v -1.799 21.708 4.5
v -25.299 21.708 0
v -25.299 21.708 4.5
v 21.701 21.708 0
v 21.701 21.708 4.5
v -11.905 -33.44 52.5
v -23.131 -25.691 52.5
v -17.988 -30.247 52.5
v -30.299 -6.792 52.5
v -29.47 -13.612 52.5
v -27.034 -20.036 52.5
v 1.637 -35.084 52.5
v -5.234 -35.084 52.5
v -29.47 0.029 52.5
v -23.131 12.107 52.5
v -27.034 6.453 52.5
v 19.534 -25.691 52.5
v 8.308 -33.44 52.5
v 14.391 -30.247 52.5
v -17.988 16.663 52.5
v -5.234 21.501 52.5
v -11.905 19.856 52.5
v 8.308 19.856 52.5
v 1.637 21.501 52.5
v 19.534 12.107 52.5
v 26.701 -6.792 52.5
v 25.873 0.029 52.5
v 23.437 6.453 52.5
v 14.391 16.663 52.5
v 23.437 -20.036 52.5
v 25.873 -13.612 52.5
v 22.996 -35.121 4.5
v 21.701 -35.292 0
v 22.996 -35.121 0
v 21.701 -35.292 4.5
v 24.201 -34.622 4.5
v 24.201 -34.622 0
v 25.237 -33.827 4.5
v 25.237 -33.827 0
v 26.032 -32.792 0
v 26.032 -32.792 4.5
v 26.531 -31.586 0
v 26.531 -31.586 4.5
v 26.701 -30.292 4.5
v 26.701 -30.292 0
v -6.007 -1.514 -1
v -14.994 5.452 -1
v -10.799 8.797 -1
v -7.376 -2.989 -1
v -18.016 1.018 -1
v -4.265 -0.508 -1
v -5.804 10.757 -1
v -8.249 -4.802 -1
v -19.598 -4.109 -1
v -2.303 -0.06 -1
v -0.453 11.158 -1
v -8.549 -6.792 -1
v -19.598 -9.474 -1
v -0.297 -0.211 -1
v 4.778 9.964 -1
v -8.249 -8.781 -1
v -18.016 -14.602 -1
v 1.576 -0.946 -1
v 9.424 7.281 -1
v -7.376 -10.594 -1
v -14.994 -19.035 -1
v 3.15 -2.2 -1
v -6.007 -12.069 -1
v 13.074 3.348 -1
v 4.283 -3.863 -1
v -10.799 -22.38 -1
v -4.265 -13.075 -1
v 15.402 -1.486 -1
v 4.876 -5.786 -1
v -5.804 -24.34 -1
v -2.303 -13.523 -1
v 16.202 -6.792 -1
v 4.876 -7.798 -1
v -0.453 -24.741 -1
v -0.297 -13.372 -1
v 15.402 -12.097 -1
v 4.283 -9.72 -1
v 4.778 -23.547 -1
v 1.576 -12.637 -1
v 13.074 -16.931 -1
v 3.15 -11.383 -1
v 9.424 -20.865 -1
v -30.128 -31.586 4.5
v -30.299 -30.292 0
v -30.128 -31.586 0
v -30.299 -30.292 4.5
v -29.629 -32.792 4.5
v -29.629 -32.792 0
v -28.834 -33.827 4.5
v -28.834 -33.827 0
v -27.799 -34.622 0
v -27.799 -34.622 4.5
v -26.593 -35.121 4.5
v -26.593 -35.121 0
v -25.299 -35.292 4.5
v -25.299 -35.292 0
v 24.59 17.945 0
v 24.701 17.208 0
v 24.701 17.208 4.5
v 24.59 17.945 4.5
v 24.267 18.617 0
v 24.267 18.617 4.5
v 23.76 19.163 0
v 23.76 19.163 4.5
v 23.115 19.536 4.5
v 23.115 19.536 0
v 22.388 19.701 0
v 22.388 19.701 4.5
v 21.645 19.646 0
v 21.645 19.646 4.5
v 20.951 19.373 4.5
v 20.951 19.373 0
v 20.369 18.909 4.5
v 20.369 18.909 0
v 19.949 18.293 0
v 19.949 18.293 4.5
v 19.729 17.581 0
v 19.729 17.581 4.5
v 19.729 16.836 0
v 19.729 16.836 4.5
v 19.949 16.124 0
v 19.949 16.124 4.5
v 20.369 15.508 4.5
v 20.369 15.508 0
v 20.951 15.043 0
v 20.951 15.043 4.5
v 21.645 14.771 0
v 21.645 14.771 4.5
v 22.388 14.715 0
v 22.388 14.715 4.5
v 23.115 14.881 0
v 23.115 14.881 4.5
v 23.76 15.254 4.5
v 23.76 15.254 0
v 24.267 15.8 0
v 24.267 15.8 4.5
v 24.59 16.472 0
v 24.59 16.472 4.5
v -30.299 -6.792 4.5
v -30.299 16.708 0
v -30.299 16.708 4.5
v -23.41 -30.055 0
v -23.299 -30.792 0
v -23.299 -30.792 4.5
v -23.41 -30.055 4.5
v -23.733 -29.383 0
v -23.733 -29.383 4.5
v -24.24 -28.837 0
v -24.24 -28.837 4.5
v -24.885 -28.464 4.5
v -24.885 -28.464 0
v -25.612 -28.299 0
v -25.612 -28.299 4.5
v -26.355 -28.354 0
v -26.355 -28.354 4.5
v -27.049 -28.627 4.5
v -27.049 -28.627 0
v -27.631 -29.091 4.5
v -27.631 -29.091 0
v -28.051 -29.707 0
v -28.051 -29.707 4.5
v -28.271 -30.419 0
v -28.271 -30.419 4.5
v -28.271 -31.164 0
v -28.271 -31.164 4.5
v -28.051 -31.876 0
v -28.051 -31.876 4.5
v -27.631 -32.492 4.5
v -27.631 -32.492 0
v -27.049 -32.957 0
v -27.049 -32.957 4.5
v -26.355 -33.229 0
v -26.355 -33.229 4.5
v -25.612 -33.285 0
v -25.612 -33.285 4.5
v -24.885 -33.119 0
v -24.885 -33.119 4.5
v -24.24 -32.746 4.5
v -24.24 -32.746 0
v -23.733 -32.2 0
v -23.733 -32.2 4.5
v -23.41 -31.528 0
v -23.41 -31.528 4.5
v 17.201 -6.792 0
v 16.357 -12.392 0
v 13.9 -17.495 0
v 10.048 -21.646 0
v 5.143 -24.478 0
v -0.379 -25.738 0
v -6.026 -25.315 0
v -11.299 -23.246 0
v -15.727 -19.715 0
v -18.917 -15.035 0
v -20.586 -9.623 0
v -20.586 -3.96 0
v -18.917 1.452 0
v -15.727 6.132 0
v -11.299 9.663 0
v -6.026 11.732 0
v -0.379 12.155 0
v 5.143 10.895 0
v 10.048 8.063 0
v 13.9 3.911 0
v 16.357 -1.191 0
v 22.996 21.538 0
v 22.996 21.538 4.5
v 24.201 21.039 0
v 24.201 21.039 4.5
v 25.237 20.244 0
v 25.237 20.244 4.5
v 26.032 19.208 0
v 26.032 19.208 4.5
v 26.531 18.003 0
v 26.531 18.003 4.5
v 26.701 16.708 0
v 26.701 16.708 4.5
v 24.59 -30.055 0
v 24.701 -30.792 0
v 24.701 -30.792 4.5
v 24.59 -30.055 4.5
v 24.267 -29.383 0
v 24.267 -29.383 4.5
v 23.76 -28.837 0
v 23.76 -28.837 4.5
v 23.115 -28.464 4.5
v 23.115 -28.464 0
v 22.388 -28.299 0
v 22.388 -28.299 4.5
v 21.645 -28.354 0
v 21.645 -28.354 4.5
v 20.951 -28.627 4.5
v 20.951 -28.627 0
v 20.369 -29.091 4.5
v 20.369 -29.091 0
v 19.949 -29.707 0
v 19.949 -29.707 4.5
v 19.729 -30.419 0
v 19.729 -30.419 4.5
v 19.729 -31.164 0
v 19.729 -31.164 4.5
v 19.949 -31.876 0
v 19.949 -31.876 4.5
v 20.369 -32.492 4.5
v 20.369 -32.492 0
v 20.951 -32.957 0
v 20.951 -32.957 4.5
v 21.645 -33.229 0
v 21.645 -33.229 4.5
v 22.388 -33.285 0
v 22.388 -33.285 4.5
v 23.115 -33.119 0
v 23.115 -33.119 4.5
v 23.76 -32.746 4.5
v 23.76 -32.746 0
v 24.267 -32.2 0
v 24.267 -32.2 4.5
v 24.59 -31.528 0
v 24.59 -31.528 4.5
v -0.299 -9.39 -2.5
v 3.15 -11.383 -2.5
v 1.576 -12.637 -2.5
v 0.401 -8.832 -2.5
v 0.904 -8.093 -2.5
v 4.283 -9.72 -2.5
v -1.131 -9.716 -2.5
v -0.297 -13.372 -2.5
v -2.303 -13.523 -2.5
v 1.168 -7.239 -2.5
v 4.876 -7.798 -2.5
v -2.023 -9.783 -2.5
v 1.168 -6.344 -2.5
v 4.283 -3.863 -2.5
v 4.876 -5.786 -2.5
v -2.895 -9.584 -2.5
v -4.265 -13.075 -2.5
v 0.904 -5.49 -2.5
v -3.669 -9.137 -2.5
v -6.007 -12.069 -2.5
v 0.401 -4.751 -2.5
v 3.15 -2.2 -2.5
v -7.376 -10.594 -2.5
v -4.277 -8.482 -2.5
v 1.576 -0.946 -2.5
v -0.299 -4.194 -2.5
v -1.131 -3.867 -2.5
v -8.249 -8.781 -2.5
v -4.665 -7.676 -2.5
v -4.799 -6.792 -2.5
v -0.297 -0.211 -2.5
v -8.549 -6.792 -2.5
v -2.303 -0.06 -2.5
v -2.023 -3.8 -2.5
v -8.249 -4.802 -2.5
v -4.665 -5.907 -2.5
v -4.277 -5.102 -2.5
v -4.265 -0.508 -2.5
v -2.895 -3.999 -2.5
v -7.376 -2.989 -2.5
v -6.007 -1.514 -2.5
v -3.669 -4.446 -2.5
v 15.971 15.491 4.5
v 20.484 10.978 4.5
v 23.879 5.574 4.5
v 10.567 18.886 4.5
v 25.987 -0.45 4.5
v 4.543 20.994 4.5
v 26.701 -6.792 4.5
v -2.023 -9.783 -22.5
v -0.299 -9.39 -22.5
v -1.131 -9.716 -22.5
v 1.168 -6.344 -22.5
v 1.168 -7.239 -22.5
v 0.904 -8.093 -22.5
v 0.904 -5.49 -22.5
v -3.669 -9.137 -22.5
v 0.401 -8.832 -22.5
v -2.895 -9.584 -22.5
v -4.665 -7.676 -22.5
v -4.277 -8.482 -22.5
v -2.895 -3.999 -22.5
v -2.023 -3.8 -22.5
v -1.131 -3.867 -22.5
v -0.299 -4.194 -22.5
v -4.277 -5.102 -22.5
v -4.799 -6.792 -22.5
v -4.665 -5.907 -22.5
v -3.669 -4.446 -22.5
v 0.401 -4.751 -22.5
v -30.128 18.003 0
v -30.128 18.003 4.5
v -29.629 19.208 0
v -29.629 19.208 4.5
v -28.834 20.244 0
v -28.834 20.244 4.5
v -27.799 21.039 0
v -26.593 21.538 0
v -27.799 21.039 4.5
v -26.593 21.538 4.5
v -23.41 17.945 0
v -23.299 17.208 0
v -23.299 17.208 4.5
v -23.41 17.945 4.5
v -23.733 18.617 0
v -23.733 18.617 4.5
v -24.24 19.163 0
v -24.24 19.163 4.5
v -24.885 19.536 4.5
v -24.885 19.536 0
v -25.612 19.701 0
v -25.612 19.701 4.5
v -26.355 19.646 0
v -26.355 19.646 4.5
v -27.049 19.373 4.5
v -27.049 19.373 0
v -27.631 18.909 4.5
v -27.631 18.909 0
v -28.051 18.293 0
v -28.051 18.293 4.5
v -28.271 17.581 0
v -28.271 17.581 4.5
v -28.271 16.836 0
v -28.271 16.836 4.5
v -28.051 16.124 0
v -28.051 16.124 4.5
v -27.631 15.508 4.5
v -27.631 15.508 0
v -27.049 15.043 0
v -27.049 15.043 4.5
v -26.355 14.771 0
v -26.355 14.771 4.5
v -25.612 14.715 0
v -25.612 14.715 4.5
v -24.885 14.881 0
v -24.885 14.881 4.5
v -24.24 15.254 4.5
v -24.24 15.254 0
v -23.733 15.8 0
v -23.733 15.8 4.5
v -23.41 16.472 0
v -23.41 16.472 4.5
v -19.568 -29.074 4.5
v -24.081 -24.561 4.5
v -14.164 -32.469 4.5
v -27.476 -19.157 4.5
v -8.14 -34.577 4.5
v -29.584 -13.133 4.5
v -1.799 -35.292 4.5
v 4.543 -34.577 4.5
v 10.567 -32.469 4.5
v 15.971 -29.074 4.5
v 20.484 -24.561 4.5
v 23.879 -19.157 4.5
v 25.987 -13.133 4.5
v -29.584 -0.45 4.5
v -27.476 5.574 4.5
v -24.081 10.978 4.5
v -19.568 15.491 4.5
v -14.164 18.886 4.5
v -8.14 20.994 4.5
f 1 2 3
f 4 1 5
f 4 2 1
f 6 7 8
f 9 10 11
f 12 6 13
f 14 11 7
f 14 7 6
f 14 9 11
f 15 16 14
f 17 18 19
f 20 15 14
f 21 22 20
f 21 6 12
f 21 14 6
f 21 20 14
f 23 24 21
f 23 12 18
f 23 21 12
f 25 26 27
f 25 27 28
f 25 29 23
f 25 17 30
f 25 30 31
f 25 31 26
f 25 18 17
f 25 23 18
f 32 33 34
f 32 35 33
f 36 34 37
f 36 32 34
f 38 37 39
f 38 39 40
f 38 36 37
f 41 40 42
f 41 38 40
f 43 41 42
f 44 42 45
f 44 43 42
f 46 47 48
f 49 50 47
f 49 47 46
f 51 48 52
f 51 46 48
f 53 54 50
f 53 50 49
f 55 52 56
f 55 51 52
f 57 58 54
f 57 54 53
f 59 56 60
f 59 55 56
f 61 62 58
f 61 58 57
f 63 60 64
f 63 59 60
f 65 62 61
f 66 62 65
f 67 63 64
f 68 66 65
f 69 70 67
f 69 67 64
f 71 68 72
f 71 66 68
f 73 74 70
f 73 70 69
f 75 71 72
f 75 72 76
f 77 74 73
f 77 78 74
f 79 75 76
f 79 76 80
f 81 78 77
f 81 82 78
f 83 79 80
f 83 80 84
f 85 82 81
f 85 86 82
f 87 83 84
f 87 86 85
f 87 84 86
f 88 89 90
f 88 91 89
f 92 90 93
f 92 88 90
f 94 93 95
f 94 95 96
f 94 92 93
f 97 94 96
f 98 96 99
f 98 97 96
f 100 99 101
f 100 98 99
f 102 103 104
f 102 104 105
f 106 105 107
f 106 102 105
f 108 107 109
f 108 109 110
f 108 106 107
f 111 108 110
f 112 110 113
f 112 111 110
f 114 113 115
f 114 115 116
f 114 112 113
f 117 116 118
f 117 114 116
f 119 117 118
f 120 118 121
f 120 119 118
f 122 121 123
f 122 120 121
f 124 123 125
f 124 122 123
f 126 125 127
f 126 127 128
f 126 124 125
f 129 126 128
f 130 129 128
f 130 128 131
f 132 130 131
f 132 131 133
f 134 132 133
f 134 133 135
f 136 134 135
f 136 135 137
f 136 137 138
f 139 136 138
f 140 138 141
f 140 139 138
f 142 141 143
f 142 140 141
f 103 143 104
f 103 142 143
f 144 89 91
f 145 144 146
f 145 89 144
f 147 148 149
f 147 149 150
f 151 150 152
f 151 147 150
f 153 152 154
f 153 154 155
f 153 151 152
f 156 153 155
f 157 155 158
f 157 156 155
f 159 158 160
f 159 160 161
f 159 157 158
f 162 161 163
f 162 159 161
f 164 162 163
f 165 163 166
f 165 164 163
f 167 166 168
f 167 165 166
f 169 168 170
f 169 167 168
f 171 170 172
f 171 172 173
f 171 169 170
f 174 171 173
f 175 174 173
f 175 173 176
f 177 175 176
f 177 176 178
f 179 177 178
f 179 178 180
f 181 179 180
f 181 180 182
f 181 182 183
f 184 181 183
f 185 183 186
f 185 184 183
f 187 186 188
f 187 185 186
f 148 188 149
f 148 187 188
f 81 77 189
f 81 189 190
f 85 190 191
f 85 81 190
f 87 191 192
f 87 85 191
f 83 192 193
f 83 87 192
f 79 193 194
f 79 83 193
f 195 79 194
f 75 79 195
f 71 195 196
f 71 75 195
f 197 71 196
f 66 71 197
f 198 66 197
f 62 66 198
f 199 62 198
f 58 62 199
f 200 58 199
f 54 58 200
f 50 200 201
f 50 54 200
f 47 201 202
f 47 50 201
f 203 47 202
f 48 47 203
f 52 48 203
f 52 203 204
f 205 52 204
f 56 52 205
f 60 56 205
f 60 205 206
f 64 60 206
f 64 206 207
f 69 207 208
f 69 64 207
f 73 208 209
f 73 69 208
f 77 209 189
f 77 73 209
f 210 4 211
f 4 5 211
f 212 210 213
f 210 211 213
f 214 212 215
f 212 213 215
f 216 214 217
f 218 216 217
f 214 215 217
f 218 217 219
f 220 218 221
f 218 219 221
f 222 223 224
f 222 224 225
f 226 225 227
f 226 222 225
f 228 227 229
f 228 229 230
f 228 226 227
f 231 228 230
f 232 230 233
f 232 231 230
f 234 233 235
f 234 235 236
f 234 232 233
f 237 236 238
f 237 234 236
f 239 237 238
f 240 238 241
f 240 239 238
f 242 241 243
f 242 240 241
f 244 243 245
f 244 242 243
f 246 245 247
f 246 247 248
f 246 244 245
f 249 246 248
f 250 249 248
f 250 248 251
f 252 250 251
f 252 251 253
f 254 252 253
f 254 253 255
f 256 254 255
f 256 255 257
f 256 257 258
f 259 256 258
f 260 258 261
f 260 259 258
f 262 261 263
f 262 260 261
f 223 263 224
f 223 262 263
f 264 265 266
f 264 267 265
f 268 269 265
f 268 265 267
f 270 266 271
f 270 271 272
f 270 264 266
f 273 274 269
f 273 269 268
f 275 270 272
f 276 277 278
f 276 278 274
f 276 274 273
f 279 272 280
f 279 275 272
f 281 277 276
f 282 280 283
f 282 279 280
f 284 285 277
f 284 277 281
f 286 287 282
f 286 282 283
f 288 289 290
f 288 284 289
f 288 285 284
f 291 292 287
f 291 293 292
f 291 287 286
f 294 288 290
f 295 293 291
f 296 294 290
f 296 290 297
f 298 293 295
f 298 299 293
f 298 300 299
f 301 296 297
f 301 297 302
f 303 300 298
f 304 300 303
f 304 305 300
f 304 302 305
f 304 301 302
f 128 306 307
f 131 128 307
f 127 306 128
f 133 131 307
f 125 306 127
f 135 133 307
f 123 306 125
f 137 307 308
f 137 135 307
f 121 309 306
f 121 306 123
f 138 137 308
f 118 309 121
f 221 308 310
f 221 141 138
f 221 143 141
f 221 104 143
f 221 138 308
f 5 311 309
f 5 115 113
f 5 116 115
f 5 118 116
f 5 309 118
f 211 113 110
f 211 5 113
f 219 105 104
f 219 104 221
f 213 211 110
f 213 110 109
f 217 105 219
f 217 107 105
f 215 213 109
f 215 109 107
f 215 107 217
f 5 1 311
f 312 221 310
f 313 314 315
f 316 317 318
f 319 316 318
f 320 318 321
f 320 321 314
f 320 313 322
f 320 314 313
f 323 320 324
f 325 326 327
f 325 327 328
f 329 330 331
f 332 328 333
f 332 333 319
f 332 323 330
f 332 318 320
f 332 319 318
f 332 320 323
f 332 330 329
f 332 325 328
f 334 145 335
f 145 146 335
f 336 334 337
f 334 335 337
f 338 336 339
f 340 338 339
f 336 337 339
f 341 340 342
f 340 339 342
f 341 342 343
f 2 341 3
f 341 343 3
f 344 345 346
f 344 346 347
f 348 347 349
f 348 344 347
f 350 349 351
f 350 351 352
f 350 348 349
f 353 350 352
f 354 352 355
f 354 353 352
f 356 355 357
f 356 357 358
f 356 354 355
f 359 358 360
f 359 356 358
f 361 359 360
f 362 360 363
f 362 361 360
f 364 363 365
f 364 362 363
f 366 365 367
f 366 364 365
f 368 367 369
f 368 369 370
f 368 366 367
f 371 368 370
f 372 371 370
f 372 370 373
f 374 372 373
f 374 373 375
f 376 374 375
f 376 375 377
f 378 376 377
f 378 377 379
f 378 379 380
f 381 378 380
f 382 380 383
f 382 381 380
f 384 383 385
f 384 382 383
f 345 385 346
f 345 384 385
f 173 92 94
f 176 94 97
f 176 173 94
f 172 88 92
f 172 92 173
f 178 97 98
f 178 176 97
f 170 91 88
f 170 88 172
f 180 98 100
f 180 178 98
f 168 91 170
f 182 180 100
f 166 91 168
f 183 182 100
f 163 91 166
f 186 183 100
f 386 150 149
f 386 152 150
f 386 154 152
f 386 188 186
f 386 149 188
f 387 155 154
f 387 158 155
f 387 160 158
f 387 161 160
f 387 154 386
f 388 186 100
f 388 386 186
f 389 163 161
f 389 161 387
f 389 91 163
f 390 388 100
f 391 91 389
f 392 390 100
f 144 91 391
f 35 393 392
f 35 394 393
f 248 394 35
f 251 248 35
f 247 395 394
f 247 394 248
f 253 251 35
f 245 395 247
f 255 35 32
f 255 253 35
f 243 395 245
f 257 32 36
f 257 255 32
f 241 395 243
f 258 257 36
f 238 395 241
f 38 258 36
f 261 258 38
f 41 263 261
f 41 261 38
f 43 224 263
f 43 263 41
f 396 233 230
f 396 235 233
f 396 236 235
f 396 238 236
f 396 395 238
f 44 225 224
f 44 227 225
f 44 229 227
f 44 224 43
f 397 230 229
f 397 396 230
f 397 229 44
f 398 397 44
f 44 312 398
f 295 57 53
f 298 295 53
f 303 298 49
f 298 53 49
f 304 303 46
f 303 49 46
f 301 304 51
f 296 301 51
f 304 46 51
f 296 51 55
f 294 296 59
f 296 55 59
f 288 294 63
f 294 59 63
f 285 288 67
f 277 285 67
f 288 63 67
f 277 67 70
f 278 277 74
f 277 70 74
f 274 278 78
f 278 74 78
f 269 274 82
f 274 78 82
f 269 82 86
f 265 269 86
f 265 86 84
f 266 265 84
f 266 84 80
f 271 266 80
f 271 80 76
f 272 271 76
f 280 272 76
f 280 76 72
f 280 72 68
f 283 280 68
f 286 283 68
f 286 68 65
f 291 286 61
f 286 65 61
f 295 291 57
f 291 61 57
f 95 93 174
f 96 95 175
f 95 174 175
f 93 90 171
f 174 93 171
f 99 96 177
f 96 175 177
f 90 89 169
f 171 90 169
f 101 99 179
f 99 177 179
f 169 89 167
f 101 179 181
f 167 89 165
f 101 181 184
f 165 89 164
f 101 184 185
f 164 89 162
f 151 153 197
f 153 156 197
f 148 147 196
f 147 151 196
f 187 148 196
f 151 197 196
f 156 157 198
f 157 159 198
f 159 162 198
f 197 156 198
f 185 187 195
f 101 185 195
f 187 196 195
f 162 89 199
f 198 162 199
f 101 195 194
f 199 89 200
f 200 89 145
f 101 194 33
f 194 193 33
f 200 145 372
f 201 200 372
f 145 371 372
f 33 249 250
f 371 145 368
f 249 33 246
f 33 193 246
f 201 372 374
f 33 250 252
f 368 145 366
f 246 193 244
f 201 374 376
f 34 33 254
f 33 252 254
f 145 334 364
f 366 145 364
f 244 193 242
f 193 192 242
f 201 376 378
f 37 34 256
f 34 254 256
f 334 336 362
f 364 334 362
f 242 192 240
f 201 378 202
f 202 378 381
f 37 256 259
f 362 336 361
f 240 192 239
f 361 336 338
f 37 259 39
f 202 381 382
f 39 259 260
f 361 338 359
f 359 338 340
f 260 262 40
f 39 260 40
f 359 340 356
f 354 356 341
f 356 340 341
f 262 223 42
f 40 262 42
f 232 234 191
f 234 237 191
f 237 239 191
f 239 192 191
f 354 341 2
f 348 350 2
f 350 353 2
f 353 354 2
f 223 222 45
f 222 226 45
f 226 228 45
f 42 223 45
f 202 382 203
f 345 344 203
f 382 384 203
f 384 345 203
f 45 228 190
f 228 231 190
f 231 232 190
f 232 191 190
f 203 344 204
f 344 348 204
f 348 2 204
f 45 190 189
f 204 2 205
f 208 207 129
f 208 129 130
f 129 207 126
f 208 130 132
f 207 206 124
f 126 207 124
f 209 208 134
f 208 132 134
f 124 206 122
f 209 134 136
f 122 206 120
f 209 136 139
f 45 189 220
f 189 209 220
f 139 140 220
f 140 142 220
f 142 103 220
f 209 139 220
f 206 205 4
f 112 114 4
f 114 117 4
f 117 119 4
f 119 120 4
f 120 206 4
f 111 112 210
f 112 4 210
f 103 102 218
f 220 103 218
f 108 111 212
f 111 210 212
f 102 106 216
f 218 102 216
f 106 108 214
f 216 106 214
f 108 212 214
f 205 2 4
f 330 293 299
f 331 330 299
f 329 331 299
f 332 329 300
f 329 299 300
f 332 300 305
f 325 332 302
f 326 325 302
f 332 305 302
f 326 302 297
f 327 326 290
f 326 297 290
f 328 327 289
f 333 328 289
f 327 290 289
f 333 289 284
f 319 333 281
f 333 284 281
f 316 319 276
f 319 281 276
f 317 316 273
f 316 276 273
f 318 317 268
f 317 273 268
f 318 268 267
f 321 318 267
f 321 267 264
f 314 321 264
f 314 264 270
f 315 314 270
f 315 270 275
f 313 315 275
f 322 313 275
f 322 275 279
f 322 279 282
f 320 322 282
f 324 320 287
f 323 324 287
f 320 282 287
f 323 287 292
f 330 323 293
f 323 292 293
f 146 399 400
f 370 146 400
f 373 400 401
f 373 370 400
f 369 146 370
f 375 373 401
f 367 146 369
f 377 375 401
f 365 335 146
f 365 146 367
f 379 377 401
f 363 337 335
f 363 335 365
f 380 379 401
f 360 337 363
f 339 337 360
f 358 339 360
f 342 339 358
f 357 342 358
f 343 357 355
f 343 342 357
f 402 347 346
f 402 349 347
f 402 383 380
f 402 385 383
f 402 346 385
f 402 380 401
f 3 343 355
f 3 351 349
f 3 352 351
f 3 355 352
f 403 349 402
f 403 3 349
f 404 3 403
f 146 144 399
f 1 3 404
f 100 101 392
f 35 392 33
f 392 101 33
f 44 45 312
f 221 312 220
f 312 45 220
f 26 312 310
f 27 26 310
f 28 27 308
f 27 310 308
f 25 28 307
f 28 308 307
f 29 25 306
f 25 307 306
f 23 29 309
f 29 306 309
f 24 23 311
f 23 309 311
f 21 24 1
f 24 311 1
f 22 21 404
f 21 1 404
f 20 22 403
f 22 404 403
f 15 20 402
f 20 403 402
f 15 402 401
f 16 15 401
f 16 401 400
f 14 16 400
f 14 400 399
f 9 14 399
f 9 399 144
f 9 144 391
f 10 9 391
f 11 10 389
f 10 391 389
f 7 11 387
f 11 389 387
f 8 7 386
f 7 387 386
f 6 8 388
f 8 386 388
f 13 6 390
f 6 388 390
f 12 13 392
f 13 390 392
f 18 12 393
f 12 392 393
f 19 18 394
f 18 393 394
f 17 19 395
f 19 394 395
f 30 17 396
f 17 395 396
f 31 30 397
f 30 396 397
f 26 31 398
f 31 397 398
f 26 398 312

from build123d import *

# Parameters (mm, degrees)
ESQUISSE1_W        = 57
ESQUISSE1_H        = 57
ESQUISSE1_R        = 2.5
BOSS_EXTRU_1_DEPTH = 4.5
CONG_2_R           = 5
ESQUISSE2_R        = 19
BOSS_EXTRU_2_DEPTH = 1
CHANFREIN1_SIZE    = 1
ESQUISSE3_R        = 28.5
BOSS_EXTRU_3_DEPTH = 48
ESQUISSE4_R        = 6.75
BOSS_EXTRU_4_DEPTH = 1.5
ESQUISSE5_R        = 3
BOSS_EXTRU_5_DEPTH = 20


with BuildPart() as part:
    # Esquisse1 → Boss.-Extru.1 (new body)
    with BuildSketch(Plane.XY):
        with Locations((-1.798558634, -6.791590494)):
            Rectangle(ESQUISSE1_W, ESQUISSE1_H)
        with Locations((-25.798558634, 17.208409506)):
            Circle(ESQUISSE1_R, mode=Mode.SUBTRACT)
        with Locations((22.201441366, 17.208409506)):
            Circle(ESQUISSE1_R, mode=Mode.SUBTRACT)
        with Locations((22.201441366, -30.791590494)):
            Circle(ESQUISSE1_R, mode=Mode.SUBTRACT)
        with Locations((-25.798558634, -30.791590494)):
            Circle(ESQUISSE1_R, mode=Mode.SUBTRACT)
    extrude(amount=BOSS_EXTRU_1_DEPTH)

    # Congé2
    cong_2_edges = [part.edges().sort_by_distance(p)[0] for p in [
        (-30.298558634, 21.708409506, 2.25),
        (26.701441366, 21.708409506, 2.25),
        (26.701441366, -35.291590494, 2.25),
        (-30.298558634, -35.291590494, 2.25),
    ]]
    fillet(cong_2_edges, radius=CONG_2_R)

    # Esquisse2 → Boss.-Extru.2 (add)
    with BuildSketch(Plane(origin=(0, 0, 0), x_dir=(-1, 0, 0), z_dir=(0, 0, -1))):
        with Locations(Location((1.798558634, -6.791590494, 0), (0, 0, 180))):
            Circle(ESQUISSE2_R)
    extrude(amount=BOSS_EXTRU_2_DEPTH)

    # Chanfrein1
    chanfrein1_edges = [part.edges().sort_by_distance(p)[0] for p in [
        (-20.798558634, -6.791590494, -1),
    ]]
    chamfer(chanfrein1_edges, length=CHANFREIN1_SIZE - 0.0001)  # a hair under: the kernel refuses the full size

    # Esquisse3 → Boss.-Extru.3 (add)
    with BuildSketch(Plane.XY.offset(4.5)):
        with Locations((-1.798558634, -6.791590494)):
            Circle(ESQUISSE3_R)
    extrude(amount=BOSS_EXTRU_3_DEPTH)

    # Esquisse4 → Boss.-Extru.4 (add)
    with BuildSketch(Plane(origin=(0, 0, -1), x_dir=(-1, 0, 0), z_dir=(0, 0, -1))):
        with Locations((1.798558634, -6.791590494)):
            Circle(ESQUISSE4_R)
    extrude(amount=BOSS_EXTRU_4_DEPTH)

    # Esquisse5 → Boss.-Extru.5 (add)
    with BuildSketch(Plane(origin=(0, 0, -2.5), x_dir=(-1, 0, 0), z_dir=(0, 0, -1))):
        with Locations((1.798558634, -6.791590494)):
            Circle(ESQUISSE5_R)
    extrude(amount=BOSS_EXTRU_5_DEPTH)


solid = part.part
